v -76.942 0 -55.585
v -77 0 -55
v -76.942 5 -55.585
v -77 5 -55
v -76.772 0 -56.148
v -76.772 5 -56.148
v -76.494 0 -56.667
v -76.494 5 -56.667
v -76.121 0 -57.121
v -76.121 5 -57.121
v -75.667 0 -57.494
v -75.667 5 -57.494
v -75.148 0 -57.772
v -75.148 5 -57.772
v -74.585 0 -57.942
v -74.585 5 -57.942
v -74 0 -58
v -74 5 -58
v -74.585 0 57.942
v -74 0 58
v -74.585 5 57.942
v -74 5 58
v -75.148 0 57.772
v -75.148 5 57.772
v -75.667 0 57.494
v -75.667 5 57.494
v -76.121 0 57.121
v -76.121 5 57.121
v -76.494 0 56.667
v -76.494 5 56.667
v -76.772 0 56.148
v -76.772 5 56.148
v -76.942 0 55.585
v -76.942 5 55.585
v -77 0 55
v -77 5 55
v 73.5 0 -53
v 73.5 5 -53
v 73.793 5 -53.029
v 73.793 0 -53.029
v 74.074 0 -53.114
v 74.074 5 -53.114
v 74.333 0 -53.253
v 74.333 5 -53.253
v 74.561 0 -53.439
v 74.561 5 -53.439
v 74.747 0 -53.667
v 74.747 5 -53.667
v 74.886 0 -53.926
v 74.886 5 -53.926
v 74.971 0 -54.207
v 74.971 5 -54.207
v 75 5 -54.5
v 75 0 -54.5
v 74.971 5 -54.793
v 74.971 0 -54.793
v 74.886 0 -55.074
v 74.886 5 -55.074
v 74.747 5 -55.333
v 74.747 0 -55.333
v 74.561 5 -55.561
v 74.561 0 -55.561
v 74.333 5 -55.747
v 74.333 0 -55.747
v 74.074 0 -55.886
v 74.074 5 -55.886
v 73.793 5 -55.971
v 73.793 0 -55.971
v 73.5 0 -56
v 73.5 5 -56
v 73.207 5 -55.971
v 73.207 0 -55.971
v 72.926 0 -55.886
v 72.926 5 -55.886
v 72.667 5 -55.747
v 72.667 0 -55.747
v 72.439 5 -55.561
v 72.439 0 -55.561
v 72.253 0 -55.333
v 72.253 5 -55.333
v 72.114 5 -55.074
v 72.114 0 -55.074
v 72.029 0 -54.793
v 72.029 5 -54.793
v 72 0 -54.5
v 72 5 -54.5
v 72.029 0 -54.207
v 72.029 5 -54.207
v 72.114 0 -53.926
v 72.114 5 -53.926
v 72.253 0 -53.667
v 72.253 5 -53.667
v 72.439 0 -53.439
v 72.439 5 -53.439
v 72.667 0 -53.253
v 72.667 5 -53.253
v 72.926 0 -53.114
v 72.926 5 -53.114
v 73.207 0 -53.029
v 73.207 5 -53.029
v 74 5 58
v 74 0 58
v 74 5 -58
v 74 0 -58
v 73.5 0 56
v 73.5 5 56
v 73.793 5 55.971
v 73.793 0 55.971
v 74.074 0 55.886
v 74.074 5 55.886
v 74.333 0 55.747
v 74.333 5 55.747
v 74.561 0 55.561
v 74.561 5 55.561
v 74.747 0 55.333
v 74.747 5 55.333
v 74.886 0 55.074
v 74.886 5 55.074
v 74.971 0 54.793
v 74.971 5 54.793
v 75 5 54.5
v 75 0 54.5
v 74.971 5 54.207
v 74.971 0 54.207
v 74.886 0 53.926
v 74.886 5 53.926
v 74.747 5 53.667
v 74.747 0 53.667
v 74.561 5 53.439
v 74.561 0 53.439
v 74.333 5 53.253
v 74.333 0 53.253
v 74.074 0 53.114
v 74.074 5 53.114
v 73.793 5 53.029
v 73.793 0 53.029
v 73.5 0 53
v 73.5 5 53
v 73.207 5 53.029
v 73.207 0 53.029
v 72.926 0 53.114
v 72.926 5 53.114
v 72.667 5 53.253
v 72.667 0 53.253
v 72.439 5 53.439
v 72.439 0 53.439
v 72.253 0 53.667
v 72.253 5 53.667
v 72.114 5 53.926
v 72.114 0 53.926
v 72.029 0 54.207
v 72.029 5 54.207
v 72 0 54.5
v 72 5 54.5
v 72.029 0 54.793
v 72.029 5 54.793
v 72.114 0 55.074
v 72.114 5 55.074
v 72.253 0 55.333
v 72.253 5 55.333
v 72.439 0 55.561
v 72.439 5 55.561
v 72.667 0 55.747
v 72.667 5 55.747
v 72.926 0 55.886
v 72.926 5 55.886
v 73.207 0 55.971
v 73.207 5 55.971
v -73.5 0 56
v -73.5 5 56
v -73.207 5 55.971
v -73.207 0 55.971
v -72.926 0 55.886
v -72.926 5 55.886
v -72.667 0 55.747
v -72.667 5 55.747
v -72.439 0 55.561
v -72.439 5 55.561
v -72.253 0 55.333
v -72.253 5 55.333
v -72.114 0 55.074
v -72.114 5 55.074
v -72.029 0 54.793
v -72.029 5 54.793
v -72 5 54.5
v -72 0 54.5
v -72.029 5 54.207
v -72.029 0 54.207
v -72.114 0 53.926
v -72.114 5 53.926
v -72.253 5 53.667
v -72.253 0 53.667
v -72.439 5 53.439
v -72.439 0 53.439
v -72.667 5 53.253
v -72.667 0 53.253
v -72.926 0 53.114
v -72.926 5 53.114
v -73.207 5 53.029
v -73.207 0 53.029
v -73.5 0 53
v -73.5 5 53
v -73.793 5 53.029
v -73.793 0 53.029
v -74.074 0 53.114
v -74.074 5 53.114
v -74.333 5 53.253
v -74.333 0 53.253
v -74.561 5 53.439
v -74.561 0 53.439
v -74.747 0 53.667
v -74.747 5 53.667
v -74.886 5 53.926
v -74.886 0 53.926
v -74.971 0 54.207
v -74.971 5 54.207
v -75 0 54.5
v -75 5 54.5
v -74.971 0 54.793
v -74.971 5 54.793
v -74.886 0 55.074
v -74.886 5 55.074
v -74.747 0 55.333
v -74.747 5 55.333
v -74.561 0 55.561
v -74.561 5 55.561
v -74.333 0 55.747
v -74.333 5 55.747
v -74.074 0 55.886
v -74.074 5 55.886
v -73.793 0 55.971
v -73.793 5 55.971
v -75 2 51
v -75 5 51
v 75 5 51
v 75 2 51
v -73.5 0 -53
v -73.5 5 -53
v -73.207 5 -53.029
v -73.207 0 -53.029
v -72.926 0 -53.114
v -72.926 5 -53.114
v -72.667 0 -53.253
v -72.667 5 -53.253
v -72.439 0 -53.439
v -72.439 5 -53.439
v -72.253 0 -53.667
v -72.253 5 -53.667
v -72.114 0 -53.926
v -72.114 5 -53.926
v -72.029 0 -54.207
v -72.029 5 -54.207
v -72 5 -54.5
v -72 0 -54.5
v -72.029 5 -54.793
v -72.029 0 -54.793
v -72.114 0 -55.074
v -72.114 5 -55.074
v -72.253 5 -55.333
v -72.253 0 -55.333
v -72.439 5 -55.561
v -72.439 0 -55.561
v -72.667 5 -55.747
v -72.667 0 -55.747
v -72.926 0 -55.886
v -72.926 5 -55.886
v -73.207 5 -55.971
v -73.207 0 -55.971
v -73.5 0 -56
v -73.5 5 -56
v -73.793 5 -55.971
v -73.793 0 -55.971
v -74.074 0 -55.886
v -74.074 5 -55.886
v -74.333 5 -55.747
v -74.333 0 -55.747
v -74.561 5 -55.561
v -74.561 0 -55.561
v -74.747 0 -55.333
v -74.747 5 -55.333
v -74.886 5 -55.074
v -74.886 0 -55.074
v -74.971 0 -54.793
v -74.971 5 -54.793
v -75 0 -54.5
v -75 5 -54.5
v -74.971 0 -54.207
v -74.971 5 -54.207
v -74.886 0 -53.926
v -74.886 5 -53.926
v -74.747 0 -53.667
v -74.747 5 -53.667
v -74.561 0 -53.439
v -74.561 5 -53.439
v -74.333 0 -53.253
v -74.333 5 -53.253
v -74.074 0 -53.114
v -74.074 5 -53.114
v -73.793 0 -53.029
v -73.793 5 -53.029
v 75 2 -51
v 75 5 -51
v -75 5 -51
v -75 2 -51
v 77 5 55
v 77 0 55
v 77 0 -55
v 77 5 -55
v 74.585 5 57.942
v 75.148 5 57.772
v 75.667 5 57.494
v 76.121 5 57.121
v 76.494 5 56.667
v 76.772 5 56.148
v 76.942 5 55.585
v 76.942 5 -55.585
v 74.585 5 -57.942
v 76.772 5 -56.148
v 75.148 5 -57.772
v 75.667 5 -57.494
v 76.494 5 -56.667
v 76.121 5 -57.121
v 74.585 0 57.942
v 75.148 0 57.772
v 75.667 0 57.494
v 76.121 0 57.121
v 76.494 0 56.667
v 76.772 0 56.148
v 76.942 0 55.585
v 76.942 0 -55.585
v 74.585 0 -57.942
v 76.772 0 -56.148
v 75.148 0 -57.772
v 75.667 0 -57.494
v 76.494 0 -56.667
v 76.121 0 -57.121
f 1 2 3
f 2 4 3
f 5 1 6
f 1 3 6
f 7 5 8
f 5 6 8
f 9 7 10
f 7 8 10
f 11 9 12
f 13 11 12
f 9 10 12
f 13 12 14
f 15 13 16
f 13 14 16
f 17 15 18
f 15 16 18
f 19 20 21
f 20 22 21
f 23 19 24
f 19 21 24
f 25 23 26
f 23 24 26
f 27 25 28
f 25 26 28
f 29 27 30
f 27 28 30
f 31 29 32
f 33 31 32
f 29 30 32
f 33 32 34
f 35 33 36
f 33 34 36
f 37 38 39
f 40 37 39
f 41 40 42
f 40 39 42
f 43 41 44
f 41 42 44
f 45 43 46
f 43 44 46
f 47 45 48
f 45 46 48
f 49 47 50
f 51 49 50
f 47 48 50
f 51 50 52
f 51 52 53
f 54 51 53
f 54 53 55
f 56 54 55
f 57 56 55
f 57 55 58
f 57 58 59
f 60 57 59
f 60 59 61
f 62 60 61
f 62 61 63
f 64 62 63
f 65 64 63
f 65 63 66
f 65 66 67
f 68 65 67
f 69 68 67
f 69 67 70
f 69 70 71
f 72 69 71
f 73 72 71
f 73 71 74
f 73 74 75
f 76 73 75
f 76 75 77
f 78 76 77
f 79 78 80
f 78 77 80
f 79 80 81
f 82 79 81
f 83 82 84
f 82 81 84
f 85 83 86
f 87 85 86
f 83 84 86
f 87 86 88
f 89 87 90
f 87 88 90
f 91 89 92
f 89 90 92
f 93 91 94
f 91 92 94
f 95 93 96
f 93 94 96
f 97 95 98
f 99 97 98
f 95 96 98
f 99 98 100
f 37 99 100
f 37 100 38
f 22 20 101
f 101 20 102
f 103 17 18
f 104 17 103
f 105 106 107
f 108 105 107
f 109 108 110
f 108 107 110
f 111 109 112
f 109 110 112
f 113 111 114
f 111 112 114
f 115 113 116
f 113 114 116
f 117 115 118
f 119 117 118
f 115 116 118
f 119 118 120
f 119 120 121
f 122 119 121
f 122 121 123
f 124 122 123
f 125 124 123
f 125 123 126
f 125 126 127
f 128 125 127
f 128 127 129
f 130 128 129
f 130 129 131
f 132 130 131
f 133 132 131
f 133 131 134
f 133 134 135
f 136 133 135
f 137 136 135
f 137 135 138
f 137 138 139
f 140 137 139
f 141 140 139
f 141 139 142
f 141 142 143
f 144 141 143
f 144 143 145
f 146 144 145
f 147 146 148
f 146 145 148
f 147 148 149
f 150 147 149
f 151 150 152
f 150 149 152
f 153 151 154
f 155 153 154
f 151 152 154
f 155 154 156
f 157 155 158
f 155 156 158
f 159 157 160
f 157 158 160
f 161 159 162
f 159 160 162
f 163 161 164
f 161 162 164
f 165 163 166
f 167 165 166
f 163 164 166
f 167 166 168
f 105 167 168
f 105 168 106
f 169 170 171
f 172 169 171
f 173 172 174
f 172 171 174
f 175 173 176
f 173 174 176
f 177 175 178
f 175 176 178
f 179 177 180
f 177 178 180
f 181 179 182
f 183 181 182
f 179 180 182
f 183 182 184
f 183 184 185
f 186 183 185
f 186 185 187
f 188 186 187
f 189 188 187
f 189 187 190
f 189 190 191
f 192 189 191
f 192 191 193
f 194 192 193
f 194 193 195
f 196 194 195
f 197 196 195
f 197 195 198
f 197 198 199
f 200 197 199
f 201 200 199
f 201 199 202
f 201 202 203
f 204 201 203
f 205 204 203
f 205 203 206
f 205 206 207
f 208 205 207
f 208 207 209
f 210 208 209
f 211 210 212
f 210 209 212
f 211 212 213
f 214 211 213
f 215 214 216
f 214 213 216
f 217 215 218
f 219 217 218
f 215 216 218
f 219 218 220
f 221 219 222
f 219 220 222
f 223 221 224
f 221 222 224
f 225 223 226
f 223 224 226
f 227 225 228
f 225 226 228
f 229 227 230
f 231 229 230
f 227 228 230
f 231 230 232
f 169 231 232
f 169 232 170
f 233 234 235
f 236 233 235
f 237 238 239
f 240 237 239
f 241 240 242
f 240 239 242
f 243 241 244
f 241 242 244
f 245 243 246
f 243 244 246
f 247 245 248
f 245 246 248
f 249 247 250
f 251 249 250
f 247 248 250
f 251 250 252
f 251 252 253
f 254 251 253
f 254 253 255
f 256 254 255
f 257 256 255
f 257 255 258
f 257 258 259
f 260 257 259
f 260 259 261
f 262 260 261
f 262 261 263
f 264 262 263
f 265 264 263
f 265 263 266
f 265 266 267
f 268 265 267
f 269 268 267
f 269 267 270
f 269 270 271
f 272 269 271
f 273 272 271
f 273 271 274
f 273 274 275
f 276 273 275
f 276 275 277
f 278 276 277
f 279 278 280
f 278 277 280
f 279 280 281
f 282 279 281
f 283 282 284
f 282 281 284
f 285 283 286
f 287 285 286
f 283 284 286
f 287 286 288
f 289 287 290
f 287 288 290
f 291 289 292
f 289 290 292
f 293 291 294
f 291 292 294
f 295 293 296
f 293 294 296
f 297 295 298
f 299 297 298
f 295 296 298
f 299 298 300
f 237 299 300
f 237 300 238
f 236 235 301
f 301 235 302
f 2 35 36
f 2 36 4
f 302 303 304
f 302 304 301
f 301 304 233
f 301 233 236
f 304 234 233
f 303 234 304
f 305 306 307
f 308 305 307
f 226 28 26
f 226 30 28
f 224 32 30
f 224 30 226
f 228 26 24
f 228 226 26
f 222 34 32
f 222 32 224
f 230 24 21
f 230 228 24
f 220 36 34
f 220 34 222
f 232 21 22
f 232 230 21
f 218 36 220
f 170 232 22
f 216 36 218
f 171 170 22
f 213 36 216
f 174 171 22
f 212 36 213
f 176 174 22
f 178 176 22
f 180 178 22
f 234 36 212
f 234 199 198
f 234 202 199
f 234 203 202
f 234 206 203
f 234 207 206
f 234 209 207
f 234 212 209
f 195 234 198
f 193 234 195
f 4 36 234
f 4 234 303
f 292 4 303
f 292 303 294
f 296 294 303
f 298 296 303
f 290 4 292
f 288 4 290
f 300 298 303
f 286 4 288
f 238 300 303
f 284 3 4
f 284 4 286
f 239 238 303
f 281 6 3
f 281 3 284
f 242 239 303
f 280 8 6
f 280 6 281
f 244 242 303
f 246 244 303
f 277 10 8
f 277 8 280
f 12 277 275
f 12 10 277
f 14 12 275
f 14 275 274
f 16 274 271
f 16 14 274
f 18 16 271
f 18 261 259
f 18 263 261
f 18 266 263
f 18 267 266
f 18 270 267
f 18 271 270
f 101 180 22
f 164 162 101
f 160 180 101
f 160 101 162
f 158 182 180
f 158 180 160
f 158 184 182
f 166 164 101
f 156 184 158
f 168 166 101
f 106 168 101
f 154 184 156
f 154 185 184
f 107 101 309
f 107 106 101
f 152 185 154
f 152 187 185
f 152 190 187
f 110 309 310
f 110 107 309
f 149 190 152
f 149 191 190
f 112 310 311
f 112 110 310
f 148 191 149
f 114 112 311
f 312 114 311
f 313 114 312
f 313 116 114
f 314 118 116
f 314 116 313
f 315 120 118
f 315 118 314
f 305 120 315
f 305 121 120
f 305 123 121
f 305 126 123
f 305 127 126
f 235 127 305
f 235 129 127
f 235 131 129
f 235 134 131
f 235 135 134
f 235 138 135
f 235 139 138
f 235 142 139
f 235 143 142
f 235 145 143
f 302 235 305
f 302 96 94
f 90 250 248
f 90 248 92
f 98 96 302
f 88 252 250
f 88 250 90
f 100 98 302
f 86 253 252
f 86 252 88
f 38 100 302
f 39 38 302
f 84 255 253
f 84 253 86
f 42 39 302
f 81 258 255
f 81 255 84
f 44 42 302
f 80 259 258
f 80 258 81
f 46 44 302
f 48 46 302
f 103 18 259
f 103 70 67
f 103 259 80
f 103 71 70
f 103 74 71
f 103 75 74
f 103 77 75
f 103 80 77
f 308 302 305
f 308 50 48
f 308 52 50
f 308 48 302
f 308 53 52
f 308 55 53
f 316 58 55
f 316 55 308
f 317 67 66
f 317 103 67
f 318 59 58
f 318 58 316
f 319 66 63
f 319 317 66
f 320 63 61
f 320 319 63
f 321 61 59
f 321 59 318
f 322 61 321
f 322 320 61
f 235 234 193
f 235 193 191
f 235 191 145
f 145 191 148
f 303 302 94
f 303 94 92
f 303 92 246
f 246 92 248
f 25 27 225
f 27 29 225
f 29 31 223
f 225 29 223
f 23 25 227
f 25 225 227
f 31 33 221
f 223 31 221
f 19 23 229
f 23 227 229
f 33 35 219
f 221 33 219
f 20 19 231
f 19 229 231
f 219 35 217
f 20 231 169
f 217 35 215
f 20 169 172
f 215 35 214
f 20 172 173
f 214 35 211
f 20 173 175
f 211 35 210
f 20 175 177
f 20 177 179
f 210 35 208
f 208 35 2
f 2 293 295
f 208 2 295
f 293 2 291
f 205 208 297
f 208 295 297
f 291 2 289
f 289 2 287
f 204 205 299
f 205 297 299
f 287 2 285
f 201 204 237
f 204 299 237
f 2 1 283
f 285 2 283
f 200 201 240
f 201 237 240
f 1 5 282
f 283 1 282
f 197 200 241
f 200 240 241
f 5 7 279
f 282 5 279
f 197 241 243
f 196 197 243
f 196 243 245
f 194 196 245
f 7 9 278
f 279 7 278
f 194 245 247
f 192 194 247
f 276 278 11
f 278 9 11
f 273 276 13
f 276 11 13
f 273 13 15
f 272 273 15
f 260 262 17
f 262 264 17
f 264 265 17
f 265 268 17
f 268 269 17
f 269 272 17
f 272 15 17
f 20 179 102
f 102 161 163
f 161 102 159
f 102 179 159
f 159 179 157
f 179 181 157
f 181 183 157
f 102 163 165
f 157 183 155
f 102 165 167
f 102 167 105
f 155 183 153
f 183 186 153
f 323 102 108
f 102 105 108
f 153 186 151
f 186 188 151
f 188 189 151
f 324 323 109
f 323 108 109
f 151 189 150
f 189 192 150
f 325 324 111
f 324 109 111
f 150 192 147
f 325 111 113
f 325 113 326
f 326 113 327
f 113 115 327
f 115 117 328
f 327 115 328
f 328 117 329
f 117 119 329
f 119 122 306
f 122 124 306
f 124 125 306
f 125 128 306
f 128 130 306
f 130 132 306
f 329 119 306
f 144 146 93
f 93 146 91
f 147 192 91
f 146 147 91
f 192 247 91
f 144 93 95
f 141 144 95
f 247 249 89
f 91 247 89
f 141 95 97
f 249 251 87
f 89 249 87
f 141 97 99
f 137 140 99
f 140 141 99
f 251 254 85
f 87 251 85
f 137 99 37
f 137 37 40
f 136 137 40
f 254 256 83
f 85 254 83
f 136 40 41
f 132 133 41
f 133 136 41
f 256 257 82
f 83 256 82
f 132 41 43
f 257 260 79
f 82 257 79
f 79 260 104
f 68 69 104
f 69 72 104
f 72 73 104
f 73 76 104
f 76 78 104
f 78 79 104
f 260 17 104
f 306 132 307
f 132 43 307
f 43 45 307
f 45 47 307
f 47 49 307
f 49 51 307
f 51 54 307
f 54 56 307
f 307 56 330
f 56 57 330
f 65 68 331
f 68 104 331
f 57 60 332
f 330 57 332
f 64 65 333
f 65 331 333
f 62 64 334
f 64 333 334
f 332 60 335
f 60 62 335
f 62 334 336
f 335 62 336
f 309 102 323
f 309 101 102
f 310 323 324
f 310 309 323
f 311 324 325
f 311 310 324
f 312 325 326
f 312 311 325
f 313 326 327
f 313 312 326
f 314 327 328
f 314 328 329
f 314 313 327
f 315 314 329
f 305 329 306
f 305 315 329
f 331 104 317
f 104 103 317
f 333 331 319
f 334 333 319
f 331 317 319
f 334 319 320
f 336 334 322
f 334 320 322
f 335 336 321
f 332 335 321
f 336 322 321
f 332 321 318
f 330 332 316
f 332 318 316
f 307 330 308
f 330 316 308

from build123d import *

# Parameters (mm, degrees)
SKETCH1_W           = 154
SKETCH1_H           = 116
BOSS_EXTRUDE1_DEPTH = 5
SKETCH2_W           = 150
SKETCH2_H           = 102
CUT_EXTRUDE1_DEPTH  = 3
SKETCH3_R           = 1.5
CUT_EXTRUDE2_DEPTH  = 97.529788149
FILLET1_R           = 3
FILLET2_R           = 3
FILLET3_R           = 3
FILLET4_R           = 3


with BuildPart() as part:
    # Sketch1 → Boss-Extrude1 (new body)
    with BuildSketch(Plane(origin=(0, 0, 0), x_dir=(1, 0, 0), z_dir=(0, 1, 0))):
        Rectangle(SKETCH1_W, SKETCH1_H)
    extrude(amount=BOSS_EXTRUDE1_DEPTH)

    # Sketch2 → Cut-Extrude1 (cut)
    with BuildSketch(Plane(origin=(0, 5, 0), x_dir=(1, 0, 0), z_dir=(0, 1, 0))):
        Rectangle(SKETCH2_W, SKETCH2_H)
    extrude(amount=-CUT_EXTRUDE1_DEPTH, mode=Mode.SUBTRACT)

    # Sketch3 → Cut-Extrude2 (cut, through all)
    with BuildSketch(Plane(origin=(0, 5, 0), x_dir=(1, 0, 0), z_dir=(0, 1, 0))):
        with Locations(Location((-73.5, 54.5, 0), (0, 0, 270))):
            Circle(SKETCH3_R)
        with Locations(Location((73.5, 54.5, 0), (0, 0, 270))):
            Circle(SKETCH3_R)
        with Locations(Location((73.5, -54.5, 0), (0, 0, 270))):
            Circle(SKETCH3_R)
        with Locations(Location((-73.5, -54.5, 0), (0, 0, 270))):
            Circle(SKETCH3_R)
    extrude(amount=-CUT_EXTRUDE2_DEPTH, mode=Mode.SUBTRACT)

    # Fillet1
    fillet1_edges = [part.edges().sort_by_distance(p)[0] for p in [
        (77, 2.5, 58),
    ]]
    fillet(fillet1_edges, radius=FILLET1_R)

    # Fillet2
    fillet2_edges = [part.edges().sort_by_distance(p)[0] for p in [
        (-77, 2.5, 58),
    ]]
    fillet(fillet2_edges, radius=FILLET2_R)

    # Fillet3
    fillet3_edges = [part.edges().sort_by_distance(p)[0] for p in [
        (-77, 2.5, -58),
    ]]
    fillet(fillet3_edges, radius=FILLET3_R)

    # Fillet4
    fillet4_edges = [part.edges().sort_by_distance(p)[0] for p in [
        (77, 2.5, -58),
    ]]
    fillet(fillet4_edges, radius=FILLET4_R)


solid = part.part
